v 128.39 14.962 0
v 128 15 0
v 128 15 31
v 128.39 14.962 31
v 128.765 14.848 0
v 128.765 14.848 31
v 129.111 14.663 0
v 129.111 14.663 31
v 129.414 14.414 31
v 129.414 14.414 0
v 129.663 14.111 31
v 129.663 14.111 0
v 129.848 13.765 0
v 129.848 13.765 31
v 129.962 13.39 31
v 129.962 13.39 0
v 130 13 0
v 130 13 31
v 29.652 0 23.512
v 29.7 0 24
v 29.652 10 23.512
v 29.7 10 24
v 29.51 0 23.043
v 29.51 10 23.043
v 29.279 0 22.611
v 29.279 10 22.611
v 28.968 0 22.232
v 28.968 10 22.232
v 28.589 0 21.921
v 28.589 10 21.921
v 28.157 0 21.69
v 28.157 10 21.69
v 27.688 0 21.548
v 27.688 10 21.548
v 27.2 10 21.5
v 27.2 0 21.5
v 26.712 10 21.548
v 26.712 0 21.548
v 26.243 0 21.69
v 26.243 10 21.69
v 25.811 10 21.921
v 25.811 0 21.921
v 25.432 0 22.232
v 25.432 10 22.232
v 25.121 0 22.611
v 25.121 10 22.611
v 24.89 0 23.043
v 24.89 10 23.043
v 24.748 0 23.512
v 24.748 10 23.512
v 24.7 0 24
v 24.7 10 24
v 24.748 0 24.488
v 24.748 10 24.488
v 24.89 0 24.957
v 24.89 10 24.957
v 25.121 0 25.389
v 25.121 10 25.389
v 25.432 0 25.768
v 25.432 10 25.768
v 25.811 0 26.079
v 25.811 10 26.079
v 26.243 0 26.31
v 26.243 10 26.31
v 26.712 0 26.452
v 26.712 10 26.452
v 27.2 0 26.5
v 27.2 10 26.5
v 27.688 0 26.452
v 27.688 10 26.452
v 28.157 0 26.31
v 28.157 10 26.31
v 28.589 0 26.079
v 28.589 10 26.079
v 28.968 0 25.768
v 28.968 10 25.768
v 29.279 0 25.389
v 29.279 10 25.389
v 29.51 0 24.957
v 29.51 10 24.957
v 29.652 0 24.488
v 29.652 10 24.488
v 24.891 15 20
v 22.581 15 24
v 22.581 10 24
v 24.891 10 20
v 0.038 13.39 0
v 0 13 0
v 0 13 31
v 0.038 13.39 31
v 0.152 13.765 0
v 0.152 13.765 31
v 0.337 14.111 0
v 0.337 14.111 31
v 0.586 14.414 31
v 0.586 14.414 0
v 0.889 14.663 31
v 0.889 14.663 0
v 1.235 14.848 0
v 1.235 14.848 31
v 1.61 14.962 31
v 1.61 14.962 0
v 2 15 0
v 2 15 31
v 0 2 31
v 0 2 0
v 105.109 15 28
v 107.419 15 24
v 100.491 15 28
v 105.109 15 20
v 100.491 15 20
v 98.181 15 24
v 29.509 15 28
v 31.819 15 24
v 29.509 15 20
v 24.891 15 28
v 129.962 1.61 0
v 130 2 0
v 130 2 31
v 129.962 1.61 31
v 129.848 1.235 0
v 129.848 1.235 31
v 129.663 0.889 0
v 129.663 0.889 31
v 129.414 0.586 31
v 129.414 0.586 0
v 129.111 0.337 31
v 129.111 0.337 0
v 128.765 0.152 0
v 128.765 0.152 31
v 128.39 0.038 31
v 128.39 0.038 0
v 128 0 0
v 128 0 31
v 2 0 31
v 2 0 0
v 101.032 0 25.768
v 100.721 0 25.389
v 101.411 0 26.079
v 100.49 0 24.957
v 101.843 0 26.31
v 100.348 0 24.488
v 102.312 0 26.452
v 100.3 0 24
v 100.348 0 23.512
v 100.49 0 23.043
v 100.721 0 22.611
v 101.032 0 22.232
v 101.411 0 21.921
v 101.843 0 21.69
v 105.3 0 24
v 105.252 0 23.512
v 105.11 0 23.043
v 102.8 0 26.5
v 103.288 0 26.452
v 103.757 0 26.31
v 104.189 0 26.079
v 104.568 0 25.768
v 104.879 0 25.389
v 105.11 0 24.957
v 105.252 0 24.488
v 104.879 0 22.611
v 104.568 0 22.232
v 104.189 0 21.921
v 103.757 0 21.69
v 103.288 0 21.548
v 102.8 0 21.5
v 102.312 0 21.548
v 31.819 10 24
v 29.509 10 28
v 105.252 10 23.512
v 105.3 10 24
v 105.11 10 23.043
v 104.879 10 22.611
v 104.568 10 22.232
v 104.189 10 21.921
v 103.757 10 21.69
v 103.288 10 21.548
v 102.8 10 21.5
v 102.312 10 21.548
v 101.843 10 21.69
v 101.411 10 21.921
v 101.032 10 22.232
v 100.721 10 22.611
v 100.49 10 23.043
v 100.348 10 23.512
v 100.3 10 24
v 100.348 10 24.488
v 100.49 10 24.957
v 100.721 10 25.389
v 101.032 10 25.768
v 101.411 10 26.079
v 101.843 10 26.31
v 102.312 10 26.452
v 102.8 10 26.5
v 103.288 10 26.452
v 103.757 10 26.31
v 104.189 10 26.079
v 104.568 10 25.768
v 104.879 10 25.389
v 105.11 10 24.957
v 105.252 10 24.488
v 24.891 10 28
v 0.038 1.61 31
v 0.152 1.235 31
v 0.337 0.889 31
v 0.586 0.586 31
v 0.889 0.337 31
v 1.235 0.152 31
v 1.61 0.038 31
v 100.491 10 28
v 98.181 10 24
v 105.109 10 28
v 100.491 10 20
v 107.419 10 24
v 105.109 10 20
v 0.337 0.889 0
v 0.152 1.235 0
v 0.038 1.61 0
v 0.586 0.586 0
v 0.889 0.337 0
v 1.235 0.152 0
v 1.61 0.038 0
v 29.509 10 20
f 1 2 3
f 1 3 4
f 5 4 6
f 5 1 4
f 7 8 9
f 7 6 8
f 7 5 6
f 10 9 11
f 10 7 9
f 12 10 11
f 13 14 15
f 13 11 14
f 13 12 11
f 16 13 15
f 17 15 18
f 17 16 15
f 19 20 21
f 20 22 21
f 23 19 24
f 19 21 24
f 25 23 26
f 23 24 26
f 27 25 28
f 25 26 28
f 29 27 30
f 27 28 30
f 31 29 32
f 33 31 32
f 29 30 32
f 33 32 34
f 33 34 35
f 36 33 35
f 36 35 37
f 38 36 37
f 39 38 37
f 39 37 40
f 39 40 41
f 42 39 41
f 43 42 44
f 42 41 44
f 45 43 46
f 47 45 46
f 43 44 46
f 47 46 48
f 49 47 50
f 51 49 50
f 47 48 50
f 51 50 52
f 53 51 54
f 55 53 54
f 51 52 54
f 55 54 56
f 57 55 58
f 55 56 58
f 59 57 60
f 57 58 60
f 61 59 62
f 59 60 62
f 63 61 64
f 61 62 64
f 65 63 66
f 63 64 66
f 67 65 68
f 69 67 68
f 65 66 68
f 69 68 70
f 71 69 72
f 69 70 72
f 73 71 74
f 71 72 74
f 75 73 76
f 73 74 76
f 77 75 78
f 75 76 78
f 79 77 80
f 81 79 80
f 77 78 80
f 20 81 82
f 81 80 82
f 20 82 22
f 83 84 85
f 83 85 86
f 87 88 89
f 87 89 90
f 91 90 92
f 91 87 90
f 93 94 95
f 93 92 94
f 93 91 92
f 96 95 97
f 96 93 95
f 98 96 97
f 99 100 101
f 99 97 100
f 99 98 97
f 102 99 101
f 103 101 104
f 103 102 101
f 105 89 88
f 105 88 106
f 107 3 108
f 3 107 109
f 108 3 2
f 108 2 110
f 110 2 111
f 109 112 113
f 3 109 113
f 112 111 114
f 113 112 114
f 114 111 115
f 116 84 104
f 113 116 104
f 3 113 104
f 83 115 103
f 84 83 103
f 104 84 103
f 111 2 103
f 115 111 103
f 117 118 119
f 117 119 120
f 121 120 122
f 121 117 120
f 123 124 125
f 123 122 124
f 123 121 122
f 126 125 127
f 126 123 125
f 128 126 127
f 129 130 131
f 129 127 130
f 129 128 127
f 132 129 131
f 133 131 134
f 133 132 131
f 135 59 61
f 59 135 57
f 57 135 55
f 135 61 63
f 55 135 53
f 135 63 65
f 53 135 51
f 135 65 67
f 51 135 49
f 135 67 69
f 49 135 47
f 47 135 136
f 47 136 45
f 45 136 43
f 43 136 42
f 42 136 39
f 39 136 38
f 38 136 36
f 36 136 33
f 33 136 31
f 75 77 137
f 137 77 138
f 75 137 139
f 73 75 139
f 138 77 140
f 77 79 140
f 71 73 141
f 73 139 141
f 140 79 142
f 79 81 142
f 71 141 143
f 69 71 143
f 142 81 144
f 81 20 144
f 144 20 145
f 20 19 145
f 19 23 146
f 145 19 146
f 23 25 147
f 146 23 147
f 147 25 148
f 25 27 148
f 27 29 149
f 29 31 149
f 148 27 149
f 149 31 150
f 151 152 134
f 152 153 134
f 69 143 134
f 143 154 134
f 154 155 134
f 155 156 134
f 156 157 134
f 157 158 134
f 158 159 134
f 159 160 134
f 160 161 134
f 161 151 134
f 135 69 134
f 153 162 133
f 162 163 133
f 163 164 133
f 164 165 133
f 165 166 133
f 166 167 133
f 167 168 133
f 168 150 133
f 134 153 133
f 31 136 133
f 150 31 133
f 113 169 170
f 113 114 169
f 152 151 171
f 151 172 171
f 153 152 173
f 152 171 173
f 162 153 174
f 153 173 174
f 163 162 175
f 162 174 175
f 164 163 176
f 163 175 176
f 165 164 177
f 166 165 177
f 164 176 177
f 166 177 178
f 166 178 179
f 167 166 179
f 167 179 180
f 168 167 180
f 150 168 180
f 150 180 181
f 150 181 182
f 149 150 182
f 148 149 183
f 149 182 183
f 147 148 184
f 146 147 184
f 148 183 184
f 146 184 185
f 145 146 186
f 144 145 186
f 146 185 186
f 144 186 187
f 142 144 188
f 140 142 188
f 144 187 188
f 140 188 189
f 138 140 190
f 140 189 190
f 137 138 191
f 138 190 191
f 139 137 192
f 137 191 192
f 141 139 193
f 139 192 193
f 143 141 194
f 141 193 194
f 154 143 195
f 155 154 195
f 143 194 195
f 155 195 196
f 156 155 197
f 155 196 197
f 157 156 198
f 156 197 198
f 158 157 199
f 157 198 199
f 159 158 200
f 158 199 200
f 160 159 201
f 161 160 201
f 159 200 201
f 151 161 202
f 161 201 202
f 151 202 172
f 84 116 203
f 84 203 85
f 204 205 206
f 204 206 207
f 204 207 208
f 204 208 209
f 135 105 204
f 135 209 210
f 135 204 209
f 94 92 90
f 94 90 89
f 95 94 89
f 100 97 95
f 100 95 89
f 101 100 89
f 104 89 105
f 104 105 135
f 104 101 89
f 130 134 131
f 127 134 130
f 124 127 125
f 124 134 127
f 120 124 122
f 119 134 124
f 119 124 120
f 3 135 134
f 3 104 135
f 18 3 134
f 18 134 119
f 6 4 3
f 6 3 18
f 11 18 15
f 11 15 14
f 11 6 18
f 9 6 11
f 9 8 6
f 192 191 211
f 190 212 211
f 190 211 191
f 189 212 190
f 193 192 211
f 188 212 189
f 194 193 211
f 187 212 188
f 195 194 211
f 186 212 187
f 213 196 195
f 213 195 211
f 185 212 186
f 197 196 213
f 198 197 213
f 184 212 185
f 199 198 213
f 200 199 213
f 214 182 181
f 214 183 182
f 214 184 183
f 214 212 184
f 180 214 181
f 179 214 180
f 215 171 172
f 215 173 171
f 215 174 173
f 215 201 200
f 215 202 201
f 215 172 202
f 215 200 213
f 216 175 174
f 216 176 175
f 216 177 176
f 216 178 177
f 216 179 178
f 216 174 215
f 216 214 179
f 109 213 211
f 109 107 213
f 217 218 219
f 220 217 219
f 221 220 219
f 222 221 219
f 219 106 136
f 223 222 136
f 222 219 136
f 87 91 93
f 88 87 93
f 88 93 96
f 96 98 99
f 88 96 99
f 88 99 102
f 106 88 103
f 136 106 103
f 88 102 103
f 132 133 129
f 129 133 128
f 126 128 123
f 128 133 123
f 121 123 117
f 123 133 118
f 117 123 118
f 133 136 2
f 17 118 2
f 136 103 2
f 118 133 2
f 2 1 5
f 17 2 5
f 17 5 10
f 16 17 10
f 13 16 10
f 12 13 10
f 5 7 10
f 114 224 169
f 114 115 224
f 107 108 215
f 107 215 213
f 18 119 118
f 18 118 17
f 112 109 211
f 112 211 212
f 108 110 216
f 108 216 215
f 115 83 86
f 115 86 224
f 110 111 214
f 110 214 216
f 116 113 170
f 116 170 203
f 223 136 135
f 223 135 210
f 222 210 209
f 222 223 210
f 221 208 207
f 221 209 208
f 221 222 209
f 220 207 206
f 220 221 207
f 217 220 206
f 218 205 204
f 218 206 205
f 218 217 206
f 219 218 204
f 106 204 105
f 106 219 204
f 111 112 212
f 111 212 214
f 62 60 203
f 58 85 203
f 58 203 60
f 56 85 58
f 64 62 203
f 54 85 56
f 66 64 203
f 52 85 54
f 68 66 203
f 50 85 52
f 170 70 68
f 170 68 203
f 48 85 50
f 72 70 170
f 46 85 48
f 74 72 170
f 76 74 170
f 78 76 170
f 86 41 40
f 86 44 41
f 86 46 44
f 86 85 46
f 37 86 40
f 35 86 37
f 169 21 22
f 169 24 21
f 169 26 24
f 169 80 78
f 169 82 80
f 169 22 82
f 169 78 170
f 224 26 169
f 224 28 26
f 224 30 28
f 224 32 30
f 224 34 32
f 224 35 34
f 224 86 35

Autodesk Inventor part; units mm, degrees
ref_plane "YZ Plane" through (0, 0, 0) normal (1, 0, 0) x (0, 1, 0)
ref_plane "XZ Plane" through (0, 0, 0) normal (0, 1, 0) x (-1, 0, 0)
ref_plane "XY Plane" through (0, 0, 0) normal (0, 0, 1) x (1, 0, 0)
sketch "Sketch1" plane through (0, 0, 0) normal (0, 0, 1) x (1, 0, 0)
  line L0 (2, 0) -> (128, 0)
  line L1 (130, 2) -> (130, 13)
  line L2 (128, 15) -> (2, 15)
  line L3 (0, 13) -> (0, 2)
  arc A0 (130, 13) -> (128, 15) centre (128, 13) ccw
  arc A1 (128, 0) -> (130, 2) centre (128, 2) ccw
  arc A2 (0, 2) -> (2, 0) centre (2, 2) ccw
  arc A3 (2, 15) -> (0, 13) centre (2, 13) ccw
  point P0 (0, 0)
  point P1 (130, 15)
  point P2 (130, 0)
  point P3 (0, 15)
  dimension "d0" = 130
  dimension "d1" = 15
  dimension "d2" = 2
extrude "Extrusion1" add sketch "Sketch1" along normal blind 31
sketch "Sketch4" plane through (2, 15, 0) normal (0, 1, 0) x (1, 0, 0)
  circle A0 centre (100.8, -24) radius 2.5
  circle A1 centre (25.2, -24) radius 2.5
  line L0 (0, 0) -> (126, 0) projected
  line L1 (126, -31) -> (0, -31) projected
  point P0 (-2, 0)
  dimension "d31" = 5
  dimension "d32" = 100.8
  dimension "d33" = 126
  dimension "d34" = 25.2
  dimension "d35" = 24
  dimension "d36" = 24
  dimension "d42" = 7
extrude "Extrusion5" cut sketch "Sketch4" against normal up to next
sketch "Sketch5" plane through (2, 15, 0) normal (0, 1, 0) x (1, 0, 0)
  circle A0 centre (100.8, -24) radius 2.5 projected
  circle A1 centre (25.2, -24) radius 2.5 projected
  line L0 (98.4906, -20) -> (103.1094, -20)
  line L1 (103.1094, -20) -> (105.4188, -24)
  line L2 (105.4188, -24) -> (103.1094, -28)
  line L3 (103.1094, -28) -> (98.4906, -28)
  line L4 (98.4906, -28) -> (96.1812, -24)
  line L5 (96.1812, -24) -> (98.4906, -20)
  line L6 (22.8906, -20) -> (27.5094, -20)
  line L7 (27.5094, -20) -> (29.8188, -24)
  line L8 (29.8188, -24) -> (27.5094, -28)
  line L9 (27.5094, -28) -> (22.8906, -28)
  line L10 (22.8906, -28) -> (20.5812, -24)
  line L11 (20.5812, -24) -> (22.8906, -20)
  point P0 (-2, 0)
  point P1 (25.2, -28)
  point P2 (100.8, -28)
  dimension "d39" = 8
extrude "Extrusion6" cut sketch "Sketch5" against normal blind 5 contours A1 | L0 L1 L2 L3 L4 L5 | L6 L7 L8 L9 L10 L11
equation "\"d32\" = 0.8 * d33"
equation "\"d34\" = 0.2 * d33"
equation "\"d36\" = d35"
properties part number "License_plate_mount"
